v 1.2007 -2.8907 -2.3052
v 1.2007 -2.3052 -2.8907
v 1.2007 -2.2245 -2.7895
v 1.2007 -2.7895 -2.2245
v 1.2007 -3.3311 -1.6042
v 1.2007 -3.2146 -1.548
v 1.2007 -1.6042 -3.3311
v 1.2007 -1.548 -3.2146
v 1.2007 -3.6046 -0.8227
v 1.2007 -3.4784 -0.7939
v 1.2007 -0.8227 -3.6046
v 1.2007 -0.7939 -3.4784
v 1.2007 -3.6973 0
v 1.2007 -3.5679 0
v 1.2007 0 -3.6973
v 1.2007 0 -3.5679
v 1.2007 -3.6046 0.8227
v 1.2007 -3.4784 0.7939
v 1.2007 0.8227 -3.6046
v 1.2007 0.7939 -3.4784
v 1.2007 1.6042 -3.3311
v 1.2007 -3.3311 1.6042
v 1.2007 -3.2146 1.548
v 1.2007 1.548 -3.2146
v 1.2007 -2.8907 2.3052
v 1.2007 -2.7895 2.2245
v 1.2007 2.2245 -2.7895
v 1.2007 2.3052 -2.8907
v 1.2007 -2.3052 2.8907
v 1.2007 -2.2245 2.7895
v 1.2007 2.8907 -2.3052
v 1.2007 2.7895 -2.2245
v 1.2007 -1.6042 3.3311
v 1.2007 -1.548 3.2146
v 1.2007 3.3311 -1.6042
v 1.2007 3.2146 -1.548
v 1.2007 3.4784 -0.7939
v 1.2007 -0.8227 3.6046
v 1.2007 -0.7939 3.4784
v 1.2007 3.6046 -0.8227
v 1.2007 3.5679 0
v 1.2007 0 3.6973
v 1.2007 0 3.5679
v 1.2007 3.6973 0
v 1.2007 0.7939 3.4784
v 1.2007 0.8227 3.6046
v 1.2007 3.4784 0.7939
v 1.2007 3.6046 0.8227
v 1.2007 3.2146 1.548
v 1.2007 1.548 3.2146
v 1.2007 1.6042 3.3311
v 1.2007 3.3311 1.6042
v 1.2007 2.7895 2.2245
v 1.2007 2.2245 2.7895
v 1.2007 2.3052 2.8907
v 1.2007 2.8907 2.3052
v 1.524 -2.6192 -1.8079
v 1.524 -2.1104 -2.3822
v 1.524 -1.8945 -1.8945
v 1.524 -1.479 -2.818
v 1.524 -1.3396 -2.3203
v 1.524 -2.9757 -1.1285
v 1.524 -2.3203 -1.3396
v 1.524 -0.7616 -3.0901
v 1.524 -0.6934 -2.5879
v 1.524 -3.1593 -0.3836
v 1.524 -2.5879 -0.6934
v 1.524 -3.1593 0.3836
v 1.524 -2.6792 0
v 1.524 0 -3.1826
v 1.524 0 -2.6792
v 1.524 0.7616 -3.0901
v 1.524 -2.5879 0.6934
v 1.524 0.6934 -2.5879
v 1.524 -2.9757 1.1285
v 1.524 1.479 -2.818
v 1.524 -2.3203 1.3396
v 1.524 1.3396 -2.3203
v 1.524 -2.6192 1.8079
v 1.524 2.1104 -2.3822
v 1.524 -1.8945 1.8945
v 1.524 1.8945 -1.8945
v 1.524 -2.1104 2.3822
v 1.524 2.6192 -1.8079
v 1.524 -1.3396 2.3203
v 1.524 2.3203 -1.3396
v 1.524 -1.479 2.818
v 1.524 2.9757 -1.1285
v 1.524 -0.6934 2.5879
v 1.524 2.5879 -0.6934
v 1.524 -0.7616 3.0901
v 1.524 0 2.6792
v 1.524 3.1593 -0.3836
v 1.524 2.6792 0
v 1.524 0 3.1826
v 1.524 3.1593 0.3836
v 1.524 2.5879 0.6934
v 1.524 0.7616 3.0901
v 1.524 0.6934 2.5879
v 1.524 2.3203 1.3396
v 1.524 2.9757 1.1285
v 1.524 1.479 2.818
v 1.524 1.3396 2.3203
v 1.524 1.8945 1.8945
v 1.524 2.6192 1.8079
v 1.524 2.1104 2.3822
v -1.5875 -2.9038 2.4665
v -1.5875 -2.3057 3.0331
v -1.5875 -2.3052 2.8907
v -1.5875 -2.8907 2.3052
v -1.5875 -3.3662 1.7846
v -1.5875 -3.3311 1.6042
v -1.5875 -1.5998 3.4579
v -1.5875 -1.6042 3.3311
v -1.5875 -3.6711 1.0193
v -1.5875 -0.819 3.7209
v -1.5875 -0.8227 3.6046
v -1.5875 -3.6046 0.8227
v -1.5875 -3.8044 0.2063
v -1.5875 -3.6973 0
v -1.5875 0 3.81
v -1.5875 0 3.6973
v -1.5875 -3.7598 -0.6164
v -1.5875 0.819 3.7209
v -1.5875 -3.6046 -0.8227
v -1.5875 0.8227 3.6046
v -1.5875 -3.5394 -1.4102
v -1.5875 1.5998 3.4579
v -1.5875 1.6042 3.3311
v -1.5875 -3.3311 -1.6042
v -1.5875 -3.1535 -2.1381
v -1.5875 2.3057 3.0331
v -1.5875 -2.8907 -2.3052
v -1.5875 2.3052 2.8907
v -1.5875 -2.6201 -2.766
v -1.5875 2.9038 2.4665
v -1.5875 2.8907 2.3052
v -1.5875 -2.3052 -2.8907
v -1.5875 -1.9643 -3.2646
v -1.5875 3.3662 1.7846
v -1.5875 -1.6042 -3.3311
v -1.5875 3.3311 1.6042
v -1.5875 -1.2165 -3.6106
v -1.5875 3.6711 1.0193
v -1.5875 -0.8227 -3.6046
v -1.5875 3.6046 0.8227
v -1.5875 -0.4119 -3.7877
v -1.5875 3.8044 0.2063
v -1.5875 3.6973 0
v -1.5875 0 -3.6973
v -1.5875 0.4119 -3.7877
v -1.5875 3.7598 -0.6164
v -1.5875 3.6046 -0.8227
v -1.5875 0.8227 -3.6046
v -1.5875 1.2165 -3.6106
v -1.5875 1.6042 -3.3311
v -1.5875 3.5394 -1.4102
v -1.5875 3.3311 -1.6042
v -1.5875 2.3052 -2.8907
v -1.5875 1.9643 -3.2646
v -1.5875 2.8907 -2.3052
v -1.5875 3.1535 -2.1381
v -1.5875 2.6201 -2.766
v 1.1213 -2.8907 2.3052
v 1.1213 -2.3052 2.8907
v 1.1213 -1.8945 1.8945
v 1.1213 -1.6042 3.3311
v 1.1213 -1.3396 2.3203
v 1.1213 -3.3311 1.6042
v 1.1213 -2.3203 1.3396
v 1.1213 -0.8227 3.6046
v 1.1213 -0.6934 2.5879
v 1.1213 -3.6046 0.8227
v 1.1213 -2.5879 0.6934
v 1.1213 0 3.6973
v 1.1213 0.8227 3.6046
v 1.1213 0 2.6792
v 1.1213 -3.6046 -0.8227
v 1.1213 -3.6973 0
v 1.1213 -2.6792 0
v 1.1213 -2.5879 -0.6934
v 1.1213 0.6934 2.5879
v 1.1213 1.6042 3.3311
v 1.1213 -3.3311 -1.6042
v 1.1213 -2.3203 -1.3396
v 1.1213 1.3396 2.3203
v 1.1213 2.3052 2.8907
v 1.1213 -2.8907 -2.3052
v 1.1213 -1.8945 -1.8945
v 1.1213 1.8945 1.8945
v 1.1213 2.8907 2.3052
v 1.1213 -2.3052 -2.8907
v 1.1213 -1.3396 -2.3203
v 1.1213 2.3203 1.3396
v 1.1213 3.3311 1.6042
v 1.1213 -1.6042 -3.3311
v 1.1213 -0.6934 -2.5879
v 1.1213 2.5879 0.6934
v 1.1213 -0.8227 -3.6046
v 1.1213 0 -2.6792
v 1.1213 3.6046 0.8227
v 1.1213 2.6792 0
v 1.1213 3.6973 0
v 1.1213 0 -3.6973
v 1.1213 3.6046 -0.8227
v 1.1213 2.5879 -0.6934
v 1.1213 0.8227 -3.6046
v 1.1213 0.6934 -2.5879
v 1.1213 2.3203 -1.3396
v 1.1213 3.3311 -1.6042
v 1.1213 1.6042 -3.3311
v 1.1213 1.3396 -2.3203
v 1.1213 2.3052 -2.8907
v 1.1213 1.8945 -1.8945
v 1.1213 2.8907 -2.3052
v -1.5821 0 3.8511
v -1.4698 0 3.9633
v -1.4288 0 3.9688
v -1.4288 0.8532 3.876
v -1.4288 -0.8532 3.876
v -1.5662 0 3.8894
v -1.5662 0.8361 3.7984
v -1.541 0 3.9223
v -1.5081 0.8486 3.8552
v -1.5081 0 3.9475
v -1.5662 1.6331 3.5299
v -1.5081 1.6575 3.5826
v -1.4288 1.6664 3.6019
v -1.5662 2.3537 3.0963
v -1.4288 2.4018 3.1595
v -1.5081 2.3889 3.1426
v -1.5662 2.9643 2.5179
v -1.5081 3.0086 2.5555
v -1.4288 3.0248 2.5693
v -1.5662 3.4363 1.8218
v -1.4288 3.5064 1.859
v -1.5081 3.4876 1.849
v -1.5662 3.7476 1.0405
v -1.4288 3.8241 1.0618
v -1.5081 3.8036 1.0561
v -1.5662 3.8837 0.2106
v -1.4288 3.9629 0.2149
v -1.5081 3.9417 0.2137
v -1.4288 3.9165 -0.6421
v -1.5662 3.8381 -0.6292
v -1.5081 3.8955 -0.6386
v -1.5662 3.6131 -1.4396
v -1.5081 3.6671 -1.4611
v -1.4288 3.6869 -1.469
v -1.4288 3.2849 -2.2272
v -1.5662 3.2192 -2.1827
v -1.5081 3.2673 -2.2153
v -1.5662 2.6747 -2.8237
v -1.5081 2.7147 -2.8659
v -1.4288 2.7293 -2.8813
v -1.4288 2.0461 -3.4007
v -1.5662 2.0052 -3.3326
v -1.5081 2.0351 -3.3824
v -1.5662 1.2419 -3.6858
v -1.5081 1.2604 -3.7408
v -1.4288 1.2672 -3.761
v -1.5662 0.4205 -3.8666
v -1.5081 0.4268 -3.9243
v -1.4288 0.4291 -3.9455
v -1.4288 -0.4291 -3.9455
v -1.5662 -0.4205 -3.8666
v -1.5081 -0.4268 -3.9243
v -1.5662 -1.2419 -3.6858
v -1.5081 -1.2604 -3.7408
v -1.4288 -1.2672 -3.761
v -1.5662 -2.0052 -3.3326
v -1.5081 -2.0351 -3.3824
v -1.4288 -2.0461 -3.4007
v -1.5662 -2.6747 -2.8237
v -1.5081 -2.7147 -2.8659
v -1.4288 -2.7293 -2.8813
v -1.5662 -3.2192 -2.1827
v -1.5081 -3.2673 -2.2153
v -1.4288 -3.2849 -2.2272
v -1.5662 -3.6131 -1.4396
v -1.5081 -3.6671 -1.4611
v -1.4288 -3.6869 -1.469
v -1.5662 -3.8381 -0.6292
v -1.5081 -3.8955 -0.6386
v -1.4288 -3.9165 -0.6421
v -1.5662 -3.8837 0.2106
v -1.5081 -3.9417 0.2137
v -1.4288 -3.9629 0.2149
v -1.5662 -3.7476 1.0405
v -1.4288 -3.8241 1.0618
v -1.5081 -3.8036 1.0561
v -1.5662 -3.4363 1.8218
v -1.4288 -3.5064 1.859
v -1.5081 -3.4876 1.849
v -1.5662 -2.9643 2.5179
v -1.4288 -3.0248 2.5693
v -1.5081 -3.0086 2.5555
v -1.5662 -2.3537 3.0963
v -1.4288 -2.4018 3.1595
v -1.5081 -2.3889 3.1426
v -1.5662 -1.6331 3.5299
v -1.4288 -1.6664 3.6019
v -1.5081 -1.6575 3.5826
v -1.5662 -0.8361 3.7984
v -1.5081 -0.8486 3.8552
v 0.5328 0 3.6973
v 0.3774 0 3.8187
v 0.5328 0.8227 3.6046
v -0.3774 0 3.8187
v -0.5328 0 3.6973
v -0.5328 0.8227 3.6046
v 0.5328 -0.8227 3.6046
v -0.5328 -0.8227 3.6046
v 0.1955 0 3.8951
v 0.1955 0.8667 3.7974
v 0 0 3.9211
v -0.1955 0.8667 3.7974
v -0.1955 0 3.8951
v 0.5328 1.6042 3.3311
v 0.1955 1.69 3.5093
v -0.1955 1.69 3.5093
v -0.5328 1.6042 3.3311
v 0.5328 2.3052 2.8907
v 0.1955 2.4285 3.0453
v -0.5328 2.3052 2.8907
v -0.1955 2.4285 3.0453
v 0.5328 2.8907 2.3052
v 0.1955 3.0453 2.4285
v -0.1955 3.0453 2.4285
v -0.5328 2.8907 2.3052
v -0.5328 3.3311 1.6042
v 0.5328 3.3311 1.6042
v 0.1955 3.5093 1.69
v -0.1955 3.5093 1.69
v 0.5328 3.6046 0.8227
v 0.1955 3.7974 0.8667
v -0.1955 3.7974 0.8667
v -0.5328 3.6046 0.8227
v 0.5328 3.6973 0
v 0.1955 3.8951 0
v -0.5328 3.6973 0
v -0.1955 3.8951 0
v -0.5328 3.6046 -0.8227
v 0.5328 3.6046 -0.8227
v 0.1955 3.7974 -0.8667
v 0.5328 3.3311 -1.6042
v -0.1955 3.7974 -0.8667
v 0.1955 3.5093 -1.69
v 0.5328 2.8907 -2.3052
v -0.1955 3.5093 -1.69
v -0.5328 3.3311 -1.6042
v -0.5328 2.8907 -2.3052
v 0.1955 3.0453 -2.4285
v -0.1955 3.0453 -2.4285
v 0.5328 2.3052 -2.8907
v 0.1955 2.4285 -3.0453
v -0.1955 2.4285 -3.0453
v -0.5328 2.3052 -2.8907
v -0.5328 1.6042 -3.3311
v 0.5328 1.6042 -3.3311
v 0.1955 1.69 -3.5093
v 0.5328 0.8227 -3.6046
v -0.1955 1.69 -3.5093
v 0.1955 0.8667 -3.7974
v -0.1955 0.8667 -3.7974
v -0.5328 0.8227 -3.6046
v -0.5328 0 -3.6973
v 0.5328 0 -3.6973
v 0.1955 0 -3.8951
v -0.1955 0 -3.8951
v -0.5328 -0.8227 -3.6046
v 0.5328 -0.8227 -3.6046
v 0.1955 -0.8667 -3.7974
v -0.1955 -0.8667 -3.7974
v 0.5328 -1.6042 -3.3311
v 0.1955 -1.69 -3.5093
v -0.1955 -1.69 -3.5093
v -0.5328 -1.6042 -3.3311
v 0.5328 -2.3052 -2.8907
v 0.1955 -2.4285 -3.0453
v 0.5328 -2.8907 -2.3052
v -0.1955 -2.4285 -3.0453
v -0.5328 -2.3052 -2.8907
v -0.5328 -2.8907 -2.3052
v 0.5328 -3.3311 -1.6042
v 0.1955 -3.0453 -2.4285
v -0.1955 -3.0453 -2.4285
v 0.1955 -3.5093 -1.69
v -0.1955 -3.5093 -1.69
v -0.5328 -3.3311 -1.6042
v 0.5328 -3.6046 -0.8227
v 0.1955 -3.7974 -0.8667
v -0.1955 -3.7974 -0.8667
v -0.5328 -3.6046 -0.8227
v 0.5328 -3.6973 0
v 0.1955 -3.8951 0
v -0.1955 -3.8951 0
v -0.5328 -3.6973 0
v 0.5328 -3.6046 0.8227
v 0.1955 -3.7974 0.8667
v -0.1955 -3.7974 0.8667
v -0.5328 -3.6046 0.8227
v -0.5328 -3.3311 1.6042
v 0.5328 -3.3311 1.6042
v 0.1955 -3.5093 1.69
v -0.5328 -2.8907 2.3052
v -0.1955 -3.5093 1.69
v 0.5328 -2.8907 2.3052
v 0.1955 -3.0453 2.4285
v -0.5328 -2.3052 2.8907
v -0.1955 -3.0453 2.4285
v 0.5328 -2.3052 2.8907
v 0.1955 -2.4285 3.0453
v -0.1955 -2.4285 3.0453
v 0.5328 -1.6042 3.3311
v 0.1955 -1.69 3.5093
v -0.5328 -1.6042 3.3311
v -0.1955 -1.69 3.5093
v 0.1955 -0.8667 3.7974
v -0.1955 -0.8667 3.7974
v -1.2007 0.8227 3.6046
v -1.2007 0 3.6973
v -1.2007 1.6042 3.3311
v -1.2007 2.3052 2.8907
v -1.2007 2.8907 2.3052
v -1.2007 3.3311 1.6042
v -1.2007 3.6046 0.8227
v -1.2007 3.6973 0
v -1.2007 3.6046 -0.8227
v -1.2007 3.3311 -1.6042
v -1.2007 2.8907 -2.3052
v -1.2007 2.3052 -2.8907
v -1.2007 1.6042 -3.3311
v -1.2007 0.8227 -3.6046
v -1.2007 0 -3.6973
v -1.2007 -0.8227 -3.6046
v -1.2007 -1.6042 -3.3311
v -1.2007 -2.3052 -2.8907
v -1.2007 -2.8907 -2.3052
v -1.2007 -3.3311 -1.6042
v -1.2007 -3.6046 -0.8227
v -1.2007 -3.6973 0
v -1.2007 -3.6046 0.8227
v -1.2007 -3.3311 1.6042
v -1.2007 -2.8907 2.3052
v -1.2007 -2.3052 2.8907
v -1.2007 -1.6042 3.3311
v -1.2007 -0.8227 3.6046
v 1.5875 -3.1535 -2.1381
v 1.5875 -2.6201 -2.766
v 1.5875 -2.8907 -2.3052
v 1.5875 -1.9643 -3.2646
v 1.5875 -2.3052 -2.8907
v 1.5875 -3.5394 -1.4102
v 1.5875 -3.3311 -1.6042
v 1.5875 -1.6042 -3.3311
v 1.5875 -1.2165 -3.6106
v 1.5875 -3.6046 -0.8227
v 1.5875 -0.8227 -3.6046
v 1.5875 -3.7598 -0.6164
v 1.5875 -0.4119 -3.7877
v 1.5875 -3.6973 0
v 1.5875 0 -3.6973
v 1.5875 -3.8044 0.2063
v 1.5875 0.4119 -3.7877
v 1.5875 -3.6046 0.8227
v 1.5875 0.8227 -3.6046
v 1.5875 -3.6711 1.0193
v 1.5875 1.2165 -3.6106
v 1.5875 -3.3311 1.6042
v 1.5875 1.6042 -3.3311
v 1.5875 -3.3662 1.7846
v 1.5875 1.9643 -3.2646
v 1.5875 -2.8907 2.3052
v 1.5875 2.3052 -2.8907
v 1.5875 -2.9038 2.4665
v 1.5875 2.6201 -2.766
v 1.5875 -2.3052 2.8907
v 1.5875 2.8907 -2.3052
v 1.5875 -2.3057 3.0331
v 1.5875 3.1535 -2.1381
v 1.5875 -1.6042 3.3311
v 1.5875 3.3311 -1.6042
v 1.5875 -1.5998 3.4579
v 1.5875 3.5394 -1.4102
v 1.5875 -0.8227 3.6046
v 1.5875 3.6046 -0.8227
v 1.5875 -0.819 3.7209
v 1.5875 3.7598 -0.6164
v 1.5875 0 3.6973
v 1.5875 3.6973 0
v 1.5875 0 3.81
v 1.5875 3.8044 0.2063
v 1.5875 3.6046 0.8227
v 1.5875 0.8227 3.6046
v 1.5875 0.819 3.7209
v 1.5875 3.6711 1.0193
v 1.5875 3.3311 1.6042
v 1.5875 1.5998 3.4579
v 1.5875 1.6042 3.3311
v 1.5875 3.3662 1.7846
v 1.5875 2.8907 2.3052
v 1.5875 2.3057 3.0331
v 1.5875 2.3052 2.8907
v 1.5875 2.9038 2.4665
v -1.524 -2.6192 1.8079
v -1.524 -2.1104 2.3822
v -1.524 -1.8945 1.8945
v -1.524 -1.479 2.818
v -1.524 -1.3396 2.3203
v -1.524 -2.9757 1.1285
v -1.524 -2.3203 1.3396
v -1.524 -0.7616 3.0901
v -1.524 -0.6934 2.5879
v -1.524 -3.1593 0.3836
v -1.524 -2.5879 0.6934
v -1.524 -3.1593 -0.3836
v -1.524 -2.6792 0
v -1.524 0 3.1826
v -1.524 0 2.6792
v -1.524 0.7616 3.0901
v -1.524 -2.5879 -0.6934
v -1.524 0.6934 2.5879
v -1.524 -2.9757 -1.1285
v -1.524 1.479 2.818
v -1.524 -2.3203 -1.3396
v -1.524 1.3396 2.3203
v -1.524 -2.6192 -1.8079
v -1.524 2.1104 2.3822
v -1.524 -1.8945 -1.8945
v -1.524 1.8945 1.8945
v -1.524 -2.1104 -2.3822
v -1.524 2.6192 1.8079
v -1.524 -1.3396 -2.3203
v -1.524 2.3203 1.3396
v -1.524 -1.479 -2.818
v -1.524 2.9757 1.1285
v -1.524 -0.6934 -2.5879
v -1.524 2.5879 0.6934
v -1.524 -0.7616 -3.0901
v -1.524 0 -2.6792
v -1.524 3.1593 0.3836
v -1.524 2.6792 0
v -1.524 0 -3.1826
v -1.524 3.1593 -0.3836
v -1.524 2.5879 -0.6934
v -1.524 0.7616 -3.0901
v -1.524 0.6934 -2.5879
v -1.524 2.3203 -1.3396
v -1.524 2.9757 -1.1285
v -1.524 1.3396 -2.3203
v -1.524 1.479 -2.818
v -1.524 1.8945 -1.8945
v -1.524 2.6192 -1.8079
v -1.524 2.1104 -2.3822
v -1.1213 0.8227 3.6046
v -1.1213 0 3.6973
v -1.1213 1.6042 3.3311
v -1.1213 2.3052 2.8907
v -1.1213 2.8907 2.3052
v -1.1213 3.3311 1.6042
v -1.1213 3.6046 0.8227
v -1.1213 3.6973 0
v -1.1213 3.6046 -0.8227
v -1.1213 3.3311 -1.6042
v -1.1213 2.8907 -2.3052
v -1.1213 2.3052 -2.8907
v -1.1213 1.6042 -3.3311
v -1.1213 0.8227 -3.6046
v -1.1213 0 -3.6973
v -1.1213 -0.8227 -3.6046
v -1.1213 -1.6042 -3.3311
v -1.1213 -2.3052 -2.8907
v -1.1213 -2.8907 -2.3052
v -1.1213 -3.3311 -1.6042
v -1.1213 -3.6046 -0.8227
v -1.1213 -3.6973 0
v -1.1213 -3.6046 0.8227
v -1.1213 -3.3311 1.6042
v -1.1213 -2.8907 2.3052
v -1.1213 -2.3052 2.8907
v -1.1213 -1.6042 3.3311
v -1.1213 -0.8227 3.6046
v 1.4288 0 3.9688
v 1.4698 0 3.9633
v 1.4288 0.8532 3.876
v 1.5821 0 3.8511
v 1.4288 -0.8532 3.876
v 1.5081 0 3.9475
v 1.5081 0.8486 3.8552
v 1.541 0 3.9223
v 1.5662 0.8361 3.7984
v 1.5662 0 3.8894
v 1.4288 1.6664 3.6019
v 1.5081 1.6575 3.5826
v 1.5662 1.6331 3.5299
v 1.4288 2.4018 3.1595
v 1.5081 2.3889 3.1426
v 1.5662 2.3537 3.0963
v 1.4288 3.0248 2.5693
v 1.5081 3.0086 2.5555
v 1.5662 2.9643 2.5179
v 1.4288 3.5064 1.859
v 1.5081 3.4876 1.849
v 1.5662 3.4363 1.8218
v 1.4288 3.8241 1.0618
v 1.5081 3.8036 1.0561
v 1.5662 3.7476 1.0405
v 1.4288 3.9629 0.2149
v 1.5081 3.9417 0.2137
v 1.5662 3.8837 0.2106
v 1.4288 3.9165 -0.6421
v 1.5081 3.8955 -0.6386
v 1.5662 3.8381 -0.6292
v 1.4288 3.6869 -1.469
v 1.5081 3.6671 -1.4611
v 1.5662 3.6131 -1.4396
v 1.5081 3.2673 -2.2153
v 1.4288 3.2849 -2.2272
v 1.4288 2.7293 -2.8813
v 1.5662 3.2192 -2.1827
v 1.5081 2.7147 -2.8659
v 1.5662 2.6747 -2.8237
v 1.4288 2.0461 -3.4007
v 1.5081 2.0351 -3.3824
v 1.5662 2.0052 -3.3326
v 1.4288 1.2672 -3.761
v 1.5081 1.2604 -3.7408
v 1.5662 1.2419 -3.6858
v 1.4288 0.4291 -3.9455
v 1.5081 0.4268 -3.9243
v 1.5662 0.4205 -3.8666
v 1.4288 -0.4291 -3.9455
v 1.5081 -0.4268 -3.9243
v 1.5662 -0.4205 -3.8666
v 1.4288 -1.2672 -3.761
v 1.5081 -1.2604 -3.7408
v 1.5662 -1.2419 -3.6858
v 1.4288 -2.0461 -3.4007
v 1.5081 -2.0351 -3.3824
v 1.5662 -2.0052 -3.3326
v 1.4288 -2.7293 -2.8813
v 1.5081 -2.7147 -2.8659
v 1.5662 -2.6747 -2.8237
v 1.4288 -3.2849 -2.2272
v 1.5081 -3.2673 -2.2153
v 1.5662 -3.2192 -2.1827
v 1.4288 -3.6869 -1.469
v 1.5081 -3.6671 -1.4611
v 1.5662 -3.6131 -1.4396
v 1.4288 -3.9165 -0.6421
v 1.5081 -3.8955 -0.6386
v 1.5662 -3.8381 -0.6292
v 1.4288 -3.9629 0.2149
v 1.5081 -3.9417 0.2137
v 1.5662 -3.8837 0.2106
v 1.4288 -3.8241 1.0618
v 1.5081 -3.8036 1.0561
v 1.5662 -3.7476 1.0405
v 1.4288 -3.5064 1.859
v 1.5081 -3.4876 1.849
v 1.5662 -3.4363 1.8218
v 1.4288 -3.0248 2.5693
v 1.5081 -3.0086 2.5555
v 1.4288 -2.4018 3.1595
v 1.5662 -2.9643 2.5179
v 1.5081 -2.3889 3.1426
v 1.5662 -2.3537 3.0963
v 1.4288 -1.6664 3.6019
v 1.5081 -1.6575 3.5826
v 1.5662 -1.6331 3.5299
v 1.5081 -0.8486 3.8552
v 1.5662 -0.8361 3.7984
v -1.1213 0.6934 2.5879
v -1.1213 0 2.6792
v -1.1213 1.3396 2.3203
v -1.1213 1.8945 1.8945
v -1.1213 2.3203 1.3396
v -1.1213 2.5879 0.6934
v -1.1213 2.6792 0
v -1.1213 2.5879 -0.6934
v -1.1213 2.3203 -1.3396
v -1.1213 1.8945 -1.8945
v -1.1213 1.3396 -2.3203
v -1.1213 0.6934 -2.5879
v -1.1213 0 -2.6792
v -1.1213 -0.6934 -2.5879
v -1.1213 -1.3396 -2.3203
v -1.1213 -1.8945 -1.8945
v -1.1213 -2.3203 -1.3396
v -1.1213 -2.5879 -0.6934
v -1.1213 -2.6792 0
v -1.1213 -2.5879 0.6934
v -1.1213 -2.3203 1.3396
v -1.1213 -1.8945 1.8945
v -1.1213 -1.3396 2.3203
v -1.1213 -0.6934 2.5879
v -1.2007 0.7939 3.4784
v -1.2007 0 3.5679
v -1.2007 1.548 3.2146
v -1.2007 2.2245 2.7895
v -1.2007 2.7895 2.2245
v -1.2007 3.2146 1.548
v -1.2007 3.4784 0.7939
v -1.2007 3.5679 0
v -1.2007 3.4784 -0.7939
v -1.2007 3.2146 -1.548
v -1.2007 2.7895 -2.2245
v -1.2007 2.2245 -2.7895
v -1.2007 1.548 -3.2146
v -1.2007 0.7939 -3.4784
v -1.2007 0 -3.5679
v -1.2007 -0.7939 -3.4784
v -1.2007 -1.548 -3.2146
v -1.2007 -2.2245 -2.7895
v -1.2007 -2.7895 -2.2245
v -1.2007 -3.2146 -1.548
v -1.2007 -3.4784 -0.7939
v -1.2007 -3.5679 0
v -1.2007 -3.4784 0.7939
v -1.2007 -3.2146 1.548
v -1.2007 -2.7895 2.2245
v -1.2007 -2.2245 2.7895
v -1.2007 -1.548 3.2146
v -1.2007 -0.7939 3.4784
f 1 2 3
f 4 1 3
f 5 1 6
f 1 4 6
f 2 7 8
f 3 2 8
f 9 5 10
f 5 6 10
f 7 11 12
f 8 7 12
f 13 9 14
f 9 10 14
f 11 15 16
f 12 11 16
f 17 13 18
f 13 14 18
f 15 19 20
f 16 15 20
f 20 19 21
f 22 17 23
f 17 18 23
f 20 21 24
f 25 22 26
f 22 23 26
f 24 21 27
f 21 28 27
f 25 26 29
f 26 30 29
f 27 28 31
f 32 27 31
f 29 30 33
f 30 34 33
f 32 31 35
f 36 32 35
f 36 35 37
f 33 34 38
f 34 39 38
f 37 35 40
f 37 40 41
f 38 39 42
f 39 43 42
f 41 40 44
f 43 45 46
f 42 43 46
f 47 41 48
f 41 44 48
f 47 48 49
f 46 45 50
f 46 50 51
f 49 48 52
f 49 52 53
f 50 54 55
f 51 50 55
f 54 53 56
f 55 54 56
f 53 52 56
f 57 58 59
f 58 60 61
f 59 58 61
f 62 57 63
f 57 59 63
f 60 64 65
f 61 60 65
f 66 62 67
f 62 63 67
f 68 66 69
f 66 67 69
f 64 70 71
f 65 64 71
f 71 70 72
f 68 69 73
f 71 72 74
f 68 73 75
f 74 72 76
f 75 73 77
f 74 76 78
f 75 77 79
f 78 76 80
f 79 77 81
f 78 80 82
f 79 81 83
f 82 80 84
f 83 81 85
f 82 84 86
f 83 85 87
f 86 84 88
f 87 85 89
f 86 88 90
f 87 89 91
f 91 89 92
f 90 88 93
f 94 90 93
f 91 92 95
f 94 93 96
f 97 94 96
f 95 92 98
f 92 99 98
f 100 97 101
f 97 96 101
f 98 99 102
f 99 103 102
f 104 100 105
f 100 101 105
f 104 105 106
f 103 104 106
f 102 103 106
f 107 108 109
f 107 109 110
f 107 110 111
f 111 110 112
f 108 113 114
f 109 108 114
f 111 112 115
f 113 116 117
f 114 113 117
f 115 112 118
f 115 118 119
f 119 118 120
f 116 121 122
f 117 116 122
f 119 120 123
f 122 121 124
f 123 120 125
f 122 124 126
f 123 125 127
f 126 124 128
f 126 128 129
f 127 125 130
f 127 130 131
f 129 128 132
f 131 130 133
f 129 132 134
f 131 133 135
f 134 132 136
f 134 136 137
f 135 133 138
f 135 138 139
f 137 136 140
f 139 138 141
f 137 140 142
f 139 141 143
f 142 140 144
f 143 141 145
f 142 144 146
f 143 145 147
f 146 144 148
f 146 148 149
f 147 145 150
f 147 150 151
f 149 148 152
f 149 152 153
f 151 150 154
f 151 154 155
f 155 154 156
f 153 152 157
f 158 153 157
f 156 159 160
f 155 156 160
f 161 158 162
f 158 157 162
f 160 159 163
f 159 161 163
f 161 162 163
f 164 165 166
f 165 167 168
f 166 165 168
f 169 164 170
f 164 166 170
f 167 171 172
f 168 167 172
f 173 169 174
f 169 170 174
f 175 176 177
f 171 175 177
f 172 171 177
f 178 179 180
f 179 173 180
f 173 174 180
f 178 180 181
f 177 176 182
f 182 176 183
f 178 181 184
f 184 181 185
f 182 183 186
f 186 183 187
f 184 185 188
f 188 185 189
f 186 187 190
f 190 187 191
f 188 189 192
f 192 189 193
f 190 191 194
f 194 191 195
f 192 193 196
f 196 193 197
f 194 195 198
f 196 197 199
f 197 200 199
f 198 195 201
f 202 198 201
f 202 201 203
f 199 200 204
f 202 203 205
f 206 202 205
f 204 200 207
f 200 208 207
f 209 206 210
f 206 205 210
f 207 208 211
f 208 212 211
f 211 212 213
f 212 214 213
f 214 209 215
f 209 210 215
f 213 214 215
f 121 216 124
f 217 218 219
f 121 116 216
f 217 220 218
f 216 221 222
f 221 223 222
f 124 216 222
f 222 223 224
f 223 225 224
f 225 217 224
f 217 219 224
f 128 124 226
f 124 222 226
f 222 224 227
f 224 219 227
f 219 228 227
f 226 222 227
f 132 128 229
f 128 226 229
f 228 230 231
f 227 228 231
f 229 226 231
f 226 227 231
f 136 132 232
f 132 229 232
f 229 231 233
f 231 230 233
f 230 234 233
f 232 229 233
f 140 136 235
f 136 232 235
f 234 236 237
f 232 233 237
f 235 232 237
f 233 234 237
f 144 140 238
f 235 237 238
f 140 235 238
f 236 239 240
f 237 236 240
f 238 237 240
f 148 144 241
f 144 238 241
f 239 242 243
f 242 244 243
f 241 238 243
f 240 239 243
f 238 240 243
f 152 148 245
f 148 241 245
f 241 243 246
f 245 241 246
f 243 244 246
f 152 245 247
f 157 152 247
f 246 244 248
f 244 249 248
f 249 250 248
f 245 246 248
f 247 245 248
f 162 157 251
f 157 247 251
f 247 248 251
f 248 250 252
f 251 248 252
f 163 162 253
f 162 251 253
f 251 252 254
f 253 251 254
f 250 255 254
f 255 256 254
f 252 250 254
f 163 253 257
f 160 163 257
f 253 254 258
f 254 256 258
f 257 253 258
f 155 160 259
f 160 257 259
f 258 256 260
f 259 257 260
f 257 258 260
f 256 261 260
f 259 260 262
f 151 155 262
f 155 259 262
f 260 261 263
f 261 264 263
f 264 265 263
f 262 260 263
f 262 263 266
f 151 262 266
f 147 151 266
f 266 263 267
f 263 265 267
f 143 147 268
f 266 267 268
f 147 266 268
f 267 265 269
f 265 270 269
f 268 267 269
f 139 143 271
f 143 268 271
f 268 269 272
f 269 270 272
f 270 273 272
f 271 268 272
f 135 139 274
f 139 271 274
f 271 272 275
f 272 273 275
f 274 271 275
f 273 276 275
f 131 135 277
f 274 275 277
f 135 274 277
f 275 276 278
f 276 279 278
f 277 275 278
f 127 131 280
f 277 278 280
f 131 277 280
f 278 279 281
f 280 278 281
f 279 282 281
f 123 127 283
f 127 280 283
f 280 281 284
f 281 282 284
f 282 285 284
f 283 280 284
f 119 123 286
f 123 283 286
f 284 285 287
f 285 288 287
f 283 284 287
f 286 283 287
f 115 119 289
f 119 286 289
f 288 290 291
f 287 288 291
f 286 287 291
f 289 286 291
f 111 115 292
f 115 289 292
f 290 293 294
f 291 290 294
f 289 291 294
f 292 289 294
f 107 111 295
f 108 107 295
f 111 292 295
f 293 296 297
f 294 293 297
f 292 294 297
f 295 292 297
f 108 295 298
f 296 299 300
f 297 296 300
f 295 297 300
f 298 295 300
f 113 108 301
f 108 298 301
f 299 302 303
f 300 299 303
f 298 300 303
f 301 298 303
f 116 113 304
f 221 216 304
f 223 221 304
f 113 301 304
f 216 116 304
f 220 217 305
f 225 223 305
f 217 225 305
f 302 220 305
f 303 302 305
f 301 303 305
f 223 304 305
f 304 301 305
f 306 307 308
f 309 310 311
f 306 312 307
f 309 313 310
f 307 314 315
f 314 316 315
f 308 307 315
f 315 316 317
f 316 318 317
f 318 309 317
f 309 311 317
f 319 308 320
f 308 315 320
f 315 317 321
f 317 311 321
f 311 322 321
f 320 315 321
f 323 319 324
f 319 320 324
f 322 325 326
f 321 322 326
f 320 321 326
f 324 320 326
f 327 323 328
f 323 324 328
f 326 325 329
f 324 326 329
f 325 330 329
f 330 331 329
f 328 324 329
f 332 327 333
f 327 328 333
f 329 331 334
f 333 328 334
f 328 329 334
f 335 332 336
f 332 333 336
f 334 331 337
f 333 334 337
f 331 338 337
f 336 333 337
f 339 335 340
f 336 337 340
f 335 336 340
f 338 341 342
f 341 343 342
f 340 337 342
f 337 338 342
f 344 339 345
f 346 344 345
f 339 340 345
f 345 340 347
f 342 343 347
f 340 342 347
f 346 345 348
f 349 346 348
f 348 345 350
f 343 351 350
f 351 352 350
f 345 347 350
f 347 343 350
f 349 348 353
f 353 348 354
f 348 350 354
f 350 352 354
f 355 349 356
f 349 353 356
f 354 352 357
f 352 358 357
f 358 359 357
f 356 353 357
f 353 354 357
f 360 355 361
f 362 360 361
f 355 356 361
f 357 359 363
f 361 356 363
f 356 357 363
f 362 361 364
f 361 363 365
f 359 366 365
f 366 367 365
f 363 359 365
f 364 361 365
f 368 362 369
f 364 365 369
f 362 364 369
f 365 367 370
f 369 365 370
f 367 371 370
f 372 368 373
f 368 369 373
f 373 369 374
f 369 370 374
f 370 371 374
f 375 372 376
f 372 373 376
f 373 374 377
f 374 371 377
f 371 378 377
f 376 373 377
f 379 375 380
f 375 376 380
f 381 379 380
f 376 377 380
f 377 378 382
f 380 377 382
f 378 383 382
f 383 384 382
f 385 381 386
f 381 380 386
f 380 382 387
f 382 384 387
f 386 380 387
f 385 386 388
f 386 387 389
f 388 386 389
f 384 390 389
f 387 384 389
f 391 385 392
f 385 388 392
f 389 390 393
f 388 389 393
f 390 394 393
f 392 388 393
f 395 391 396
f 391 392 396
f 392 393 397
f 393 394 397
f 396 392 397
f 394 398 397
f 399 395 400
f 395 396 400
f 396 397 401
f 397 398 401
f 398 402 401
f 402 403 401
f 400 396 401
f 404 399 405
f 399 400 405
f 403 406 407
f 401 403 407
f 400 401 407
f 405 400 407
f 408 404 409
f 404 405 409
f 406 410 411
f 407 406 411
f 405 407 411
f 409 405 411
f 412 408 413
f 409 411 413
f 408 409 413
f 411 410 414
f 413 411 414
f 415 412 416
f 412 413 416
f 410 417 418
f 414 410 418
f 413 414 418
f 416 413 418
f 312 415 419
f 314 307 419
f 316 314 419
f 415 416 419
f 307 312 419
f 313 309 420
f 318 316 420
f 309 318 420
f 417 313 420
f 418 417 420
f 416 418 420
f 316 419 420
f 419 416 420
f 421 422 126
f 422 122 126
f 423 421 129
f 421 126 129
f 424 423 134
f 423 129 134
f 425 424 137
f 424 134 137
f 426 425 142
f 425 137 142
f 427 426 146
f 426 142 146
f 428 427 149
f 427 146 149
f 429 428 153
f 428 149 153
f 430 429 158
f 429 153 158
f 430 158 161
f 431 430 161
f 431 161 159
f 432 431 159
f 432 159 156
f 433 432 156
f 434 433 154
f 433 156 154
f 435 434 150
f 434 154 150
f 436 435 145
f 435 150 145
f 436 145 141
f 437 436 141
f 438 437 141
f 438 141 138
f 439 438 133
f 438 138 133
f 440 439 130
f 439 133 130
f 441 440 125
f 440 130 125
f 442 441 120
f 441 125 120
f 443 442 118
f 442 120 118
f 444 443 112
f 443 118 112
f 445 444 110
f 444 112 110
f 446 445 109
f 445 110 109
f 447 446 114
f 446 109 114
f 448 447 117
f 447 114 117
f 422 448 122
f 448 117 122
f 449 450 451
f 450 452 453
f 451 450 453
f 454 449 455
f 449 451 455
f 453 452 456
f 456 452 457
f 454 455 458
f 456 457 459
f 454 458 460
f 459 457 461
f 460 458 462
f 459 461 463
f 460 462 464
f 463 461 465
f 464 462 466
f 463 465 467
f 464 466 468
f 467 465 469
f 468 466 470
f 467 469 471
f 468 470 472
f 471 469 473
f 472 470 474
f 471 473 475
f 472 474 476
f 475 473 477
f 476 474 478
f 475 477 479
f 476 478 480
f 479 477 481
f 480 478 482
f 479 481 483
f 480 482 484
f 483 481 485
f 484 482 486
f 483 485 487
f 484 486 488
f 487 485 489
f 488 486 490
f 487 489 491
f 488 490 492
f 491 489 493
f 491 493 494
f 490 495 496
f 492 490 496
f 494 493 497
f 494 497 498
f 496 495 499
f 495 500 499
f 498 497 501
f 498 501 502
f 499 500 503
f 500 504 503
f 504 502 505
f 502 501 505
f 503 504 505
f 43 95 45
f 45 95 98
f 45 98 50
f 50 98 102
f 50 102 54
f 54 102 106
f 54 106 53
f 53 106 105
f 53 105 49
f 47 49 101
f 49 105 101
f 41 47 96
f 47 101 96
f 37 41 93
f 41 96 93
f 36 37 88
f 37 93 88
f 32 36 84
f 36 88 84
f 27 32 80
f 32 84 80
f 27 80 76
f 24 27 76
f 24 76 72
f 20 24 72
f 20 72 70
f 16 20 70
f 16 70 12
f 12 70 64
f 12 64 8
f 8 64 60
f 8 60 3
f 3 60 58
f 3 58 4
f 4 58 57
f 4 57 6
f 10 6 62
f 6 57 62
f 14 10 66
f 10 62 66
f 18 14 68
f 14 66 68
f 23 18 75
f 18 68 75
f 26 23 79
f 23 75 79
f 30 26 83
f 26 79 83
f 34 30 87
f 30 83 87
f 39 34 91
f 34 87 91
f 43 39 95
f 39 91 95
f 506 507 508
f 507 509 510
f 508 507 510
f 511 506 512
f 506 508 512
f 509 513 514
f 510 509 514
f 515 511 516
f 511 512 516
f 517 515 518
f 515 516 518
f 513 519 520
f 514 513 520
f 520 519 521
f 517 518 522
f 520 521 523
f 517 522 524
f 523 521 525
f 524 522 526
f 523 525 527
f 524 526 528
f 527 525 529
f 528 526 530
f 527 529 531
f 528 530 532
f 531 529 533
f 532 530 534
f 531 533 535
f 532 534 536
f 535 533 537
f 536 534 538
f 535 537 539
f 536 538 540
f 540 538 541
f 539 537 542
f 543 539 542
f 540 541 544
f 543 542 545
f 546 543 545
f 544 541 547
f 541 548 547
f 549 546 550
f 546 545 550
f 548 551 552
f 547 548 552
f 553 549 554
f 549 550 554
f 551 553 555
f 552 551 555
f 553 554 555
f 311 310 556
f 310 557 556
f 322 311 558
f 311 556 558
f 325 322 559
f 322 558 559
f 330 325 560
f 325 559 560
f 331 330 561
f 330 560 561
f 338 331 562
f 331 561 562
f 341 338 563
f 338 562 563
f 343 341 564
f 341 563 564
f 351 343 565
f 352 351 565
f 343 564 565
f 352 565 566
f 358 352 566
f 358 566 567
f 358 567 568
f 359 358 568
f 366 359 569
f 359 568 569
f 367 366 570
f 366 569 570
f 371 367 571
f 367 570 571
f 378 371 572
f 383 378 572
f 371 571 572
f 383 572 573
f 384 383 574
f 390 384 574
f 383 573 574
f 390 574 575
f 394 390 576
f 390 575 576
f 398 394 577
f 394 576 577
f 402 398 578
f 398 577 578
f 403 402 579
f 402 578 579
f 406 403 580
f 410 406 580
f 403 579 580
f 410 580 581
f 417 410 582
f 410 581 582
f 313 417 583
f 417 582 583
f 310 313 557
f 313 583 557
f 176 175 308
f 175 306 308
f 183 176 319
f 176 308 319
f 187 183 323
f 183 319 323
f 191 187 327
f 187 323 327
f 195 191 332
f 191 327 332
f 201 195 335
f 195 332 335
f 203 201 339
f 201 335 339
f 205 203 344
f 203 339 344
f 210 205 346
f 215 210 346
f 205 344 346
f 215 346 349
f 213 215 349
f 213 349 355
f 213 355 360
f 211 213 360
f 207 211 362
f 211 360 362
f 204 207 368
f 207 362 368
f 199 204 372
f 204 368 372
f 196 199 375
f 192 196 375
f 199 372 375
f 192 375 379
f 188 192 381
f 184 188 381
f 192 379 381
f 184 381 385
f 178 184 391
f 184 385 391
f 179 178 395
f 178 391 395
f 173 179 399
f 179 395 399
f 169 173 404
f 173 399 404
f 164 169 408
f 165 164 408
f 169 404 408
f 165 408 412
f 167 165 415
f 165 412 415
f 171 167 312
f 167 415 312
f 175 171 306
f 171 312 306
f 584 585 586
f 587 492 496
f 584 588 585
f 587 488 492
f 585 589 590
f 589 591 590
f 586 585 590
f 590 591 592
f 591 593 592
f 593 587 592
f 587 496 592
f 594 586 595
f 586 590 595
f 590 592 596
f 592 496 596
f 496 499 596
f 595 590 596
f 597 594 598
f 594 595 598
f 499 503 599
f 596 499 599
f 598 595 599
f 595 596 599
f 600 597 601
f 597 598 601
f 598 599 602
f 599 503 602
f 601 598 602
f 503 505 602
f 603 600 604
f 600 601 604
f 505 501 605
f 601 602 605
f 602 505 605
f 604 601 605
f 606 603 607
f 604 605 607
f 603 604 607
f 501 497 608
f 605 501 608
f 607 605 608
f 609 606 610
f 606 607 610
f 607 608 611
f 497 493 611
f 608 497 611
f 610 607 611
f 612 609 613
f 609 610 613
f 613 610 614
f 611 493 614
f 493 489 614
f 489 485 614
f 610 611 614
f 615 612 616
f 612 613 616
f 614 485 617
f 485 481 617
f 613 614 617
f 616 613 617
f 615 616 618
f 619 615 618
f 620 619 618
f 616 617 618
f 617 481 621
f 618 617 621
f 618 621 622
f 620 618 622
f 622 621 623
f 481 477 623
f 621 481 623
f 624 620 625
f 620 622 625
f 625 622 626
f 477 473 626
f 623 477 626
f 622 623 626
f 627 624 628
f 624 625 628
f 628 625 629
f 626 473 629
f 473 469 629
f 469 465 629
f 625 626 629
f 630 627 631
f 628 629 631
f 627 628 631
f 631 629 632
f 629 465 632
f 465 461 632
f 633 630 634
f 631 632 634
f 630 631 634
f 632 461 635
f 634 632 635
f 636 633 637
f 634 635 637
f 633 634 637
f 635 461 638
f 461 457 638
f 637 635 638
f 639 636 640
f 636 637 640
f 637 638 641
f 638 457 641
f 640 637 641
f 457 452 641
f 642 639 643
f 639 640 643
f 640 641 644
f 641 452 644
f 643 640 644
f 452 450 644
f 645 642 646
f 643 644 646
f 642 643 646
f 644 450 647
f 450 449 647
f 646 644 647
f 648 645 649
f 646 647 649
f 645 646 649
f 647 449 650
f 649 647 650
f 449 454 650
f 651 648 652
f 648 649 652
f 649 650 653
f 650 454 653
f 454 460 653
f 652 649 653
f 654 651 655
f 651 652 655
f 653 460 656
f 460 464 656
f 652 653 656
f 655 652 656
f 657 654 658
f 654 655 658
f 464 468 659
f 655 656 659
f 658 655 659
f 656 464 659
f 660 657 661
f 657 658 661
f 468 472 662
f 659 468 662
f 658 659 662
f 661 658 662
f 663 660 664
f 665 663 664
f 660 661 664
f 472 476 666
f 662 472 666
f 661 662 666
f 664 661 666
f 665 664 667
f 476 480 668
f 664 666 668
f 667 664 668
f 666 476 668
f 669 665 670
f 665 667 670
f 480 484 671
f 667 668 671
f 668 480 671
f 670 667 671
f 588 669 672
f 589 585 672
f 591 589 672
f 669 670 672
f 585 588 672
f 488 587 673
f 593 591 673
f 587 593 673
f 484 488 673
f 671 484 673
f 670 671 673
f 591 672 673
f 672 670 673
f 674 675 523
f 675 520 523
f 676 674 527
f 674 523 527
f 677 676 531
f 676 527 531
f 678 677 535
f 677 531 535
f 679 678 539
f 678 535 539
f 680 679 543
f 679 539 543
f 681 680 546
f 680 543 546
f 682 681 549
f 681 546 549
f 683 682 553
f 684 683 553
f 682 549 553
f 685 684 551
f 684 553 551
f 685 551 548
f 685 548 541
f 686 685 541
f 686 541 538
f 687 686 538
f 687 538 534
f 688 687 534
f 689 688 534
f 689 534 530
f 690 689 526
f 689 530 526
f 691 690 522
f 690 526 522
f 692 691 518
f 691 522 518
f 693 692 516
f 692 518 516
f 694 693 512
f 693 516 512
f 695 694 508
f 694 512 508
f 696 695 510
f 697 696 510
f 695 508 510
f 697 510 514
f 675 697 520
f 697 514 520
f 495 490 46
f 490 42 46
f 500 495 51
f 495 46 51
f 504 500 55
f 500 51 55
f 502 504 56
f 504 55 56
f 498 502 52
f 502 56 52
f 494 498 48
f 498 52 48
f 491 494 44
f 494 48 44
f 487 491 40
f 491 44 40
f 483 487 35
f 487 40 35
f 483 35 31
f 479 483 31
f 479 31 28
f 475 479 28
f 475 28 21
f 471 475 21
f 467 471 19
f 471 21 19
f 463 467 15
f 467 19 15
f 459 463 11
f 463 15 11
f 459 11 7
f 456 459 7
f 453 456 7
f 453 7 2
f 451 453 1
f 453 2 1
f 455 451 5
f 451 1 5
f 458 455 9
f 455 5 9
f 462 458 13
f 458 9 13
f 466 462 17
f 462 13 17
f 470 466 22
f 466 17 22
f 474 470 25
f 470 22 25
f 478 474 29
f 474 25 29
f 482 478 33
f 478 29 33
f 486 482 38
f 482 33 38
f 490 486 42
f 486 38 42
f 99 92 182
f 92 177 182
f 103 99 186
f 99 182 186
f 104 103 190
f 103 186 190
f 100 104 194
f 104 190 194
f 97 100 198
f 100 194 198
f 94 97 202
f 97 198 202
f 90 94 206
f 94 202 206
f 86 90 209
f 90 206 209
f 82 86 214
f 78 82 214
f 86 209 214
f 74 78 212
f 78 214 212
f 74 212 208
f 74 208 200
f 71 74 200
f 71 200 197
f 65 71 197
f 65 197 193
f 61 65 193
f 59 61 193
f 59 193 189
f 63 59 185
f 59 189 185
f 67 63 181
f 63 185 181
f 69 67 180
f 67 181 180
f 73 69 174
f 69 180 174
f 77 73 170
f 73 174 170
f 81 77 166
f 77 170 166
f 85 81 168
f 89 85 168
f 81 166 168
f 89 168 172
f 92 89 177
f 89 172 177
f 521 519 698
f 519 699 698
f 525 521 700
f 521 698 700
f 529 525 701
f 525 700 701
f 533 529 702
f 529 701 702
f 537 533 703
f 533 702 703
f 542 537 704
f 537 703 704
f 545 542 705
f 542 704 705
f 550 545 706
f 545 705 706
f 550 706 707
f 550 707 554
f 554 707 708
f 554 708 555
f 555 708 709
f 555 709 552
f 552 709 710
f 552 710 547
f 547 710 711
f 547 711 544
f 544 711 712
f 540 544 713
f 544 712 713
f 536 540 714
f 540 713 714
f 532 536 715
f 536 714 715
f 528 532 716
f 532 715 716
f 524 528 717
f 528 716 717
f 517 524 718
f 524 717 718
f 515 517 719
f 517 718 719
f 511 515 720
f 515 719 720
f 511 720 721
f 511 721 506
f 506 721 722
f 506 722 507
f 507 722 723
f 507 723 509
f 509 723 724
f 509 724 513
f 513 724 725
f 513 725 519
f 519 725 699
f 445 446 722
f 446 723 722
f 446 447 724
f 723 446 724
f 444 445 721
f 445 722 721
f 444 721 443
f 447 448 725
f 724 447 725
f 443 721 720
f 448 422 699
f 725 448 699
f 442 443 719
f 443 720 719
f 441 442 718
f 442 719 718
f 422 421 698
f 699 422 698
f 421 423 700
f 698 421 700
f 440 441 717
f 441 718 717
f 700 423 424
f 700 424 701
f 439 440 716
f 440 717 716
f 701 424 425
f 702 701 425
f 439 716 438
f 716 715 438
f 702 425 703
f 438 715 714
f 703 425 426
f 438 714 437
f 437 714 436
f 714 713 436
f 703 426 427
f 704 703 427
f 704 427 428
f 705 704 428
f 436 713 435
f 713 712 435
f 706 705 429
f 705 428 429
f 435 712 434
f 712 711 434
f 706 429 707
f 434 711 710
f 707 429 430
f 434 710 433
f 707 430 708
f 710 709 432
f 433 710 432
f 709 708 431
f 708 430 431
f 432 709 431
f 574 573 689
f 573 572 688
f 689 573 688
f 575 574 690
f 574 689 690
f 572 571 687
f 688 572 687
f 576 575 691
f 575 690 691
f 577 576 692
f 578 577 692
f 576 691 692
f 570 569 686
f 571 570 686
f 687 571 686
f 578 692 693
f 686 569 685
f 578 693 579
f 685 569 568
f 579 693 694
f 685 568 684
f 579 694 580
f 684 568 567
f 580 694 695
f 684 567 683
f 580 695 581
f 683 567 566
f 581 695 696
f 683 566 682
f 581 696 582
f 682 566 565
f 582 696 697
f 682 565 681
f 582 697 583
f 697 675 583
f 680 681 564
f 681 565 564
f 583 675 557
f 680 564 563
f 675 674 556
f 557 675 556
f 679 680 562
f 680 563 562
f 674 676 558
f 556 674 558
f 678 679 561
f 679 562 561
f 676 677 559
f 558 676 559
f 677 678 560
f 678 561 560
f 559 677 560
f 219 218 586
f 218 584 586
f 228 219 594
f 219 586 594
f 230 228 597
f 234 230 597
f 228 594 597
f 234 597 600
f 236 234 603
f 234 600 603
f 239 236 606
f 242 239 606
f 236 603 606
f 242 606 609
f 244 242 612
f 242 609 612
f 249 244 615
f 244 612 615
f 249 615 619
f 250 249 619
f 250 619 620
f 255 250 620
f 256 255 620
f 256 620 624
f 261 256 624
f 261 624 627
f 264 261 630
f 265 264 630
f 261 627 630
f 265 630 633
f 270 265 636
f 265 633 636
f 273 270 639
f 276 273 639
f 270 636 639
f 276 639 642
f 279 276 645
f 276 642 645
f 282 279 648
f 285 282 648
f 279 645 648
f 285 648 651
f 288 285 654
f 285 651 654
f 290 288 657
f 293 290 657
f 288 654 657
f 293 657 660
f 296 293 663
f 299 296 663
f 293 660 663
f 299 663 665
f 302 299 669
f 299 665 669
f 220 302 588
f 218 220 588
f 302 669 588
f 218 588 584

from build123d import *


with BuildPart() as part:
    # Sketch1 → Revolve1 (revolve)
    with BuildSketch(Plane(origin=(0, 0, 0), x_dir=(-1, 0, 0), z_dir=(0, 0, -1)), mode=Mode.PRIVATE) as revolve1_sk:
        with BuildLine():
            Line((1.524, 3.182551134), (1.200668646, 3.567882438))
            Line((1.200668646, 3.567882438), (1.200668646, 3.6972875))
            Line((1.200668646, 3.6972875), (1.5875, 3.6972875))
            Line((1.5875, 3.6972875), (1.5875, 3.81))
            ThreePointArc((1.5875, 3.81), (1.541003202, 3.922253202), (1.42875, 3.96875))
            Line((1.42875, 3.96875), (-1.42875, 3.96875))
            ThreePointArc((-1.42875, 3.96875), (-1.541003202, 3.922253202), (-1.5875, 3.81))
            Line((-1.5875, 3.81), (-1.5875, 3.6972875))
            Line((-1.5875, 3.6972875), (-1.200668646, 3.6972875))
            Line((-1.200668646, 3.6972875), (-1.200668646, 3.567882438))
            Line((-1.200668646, 3.567882438), (-1.524, 3.182551134))
            Line((-1.524, 3.182551134), (-1.524, 2.679239625))
            Line((-1.524, 2.679239625), (-1.121293646, 2.679239625))
            Line((-1.121293646, 2.679239625), (-1.121293646, 3.6972875))
            Line((-1.121293646, 3.6972875), (-0.532839829, 3.6972875))
            ThreePointArc((-0.532839829, 3.6972875), (0, 3.921125), (0.532839829, 3.6972875))
            Line((0.532839829, 3.6972875), (1.121293646, 3.6972875))
            Line((1.121293646, 3.6972875), (1.121293646, 2.679239625))
            Line((1.121293646, 2.679239625), (1.524, 2.679239625))
            Line((1.524, 2.679239625), (1.524, 3.182551134))
        make_face()
    revolve(revolve1_sk.sketch.rotate(Axis((1.5875, 0, 0), (-1, 0, 0)), 270), axis=Axis((1.5875, 0, 0), (-1, 0, 0)))


solid = part.part
